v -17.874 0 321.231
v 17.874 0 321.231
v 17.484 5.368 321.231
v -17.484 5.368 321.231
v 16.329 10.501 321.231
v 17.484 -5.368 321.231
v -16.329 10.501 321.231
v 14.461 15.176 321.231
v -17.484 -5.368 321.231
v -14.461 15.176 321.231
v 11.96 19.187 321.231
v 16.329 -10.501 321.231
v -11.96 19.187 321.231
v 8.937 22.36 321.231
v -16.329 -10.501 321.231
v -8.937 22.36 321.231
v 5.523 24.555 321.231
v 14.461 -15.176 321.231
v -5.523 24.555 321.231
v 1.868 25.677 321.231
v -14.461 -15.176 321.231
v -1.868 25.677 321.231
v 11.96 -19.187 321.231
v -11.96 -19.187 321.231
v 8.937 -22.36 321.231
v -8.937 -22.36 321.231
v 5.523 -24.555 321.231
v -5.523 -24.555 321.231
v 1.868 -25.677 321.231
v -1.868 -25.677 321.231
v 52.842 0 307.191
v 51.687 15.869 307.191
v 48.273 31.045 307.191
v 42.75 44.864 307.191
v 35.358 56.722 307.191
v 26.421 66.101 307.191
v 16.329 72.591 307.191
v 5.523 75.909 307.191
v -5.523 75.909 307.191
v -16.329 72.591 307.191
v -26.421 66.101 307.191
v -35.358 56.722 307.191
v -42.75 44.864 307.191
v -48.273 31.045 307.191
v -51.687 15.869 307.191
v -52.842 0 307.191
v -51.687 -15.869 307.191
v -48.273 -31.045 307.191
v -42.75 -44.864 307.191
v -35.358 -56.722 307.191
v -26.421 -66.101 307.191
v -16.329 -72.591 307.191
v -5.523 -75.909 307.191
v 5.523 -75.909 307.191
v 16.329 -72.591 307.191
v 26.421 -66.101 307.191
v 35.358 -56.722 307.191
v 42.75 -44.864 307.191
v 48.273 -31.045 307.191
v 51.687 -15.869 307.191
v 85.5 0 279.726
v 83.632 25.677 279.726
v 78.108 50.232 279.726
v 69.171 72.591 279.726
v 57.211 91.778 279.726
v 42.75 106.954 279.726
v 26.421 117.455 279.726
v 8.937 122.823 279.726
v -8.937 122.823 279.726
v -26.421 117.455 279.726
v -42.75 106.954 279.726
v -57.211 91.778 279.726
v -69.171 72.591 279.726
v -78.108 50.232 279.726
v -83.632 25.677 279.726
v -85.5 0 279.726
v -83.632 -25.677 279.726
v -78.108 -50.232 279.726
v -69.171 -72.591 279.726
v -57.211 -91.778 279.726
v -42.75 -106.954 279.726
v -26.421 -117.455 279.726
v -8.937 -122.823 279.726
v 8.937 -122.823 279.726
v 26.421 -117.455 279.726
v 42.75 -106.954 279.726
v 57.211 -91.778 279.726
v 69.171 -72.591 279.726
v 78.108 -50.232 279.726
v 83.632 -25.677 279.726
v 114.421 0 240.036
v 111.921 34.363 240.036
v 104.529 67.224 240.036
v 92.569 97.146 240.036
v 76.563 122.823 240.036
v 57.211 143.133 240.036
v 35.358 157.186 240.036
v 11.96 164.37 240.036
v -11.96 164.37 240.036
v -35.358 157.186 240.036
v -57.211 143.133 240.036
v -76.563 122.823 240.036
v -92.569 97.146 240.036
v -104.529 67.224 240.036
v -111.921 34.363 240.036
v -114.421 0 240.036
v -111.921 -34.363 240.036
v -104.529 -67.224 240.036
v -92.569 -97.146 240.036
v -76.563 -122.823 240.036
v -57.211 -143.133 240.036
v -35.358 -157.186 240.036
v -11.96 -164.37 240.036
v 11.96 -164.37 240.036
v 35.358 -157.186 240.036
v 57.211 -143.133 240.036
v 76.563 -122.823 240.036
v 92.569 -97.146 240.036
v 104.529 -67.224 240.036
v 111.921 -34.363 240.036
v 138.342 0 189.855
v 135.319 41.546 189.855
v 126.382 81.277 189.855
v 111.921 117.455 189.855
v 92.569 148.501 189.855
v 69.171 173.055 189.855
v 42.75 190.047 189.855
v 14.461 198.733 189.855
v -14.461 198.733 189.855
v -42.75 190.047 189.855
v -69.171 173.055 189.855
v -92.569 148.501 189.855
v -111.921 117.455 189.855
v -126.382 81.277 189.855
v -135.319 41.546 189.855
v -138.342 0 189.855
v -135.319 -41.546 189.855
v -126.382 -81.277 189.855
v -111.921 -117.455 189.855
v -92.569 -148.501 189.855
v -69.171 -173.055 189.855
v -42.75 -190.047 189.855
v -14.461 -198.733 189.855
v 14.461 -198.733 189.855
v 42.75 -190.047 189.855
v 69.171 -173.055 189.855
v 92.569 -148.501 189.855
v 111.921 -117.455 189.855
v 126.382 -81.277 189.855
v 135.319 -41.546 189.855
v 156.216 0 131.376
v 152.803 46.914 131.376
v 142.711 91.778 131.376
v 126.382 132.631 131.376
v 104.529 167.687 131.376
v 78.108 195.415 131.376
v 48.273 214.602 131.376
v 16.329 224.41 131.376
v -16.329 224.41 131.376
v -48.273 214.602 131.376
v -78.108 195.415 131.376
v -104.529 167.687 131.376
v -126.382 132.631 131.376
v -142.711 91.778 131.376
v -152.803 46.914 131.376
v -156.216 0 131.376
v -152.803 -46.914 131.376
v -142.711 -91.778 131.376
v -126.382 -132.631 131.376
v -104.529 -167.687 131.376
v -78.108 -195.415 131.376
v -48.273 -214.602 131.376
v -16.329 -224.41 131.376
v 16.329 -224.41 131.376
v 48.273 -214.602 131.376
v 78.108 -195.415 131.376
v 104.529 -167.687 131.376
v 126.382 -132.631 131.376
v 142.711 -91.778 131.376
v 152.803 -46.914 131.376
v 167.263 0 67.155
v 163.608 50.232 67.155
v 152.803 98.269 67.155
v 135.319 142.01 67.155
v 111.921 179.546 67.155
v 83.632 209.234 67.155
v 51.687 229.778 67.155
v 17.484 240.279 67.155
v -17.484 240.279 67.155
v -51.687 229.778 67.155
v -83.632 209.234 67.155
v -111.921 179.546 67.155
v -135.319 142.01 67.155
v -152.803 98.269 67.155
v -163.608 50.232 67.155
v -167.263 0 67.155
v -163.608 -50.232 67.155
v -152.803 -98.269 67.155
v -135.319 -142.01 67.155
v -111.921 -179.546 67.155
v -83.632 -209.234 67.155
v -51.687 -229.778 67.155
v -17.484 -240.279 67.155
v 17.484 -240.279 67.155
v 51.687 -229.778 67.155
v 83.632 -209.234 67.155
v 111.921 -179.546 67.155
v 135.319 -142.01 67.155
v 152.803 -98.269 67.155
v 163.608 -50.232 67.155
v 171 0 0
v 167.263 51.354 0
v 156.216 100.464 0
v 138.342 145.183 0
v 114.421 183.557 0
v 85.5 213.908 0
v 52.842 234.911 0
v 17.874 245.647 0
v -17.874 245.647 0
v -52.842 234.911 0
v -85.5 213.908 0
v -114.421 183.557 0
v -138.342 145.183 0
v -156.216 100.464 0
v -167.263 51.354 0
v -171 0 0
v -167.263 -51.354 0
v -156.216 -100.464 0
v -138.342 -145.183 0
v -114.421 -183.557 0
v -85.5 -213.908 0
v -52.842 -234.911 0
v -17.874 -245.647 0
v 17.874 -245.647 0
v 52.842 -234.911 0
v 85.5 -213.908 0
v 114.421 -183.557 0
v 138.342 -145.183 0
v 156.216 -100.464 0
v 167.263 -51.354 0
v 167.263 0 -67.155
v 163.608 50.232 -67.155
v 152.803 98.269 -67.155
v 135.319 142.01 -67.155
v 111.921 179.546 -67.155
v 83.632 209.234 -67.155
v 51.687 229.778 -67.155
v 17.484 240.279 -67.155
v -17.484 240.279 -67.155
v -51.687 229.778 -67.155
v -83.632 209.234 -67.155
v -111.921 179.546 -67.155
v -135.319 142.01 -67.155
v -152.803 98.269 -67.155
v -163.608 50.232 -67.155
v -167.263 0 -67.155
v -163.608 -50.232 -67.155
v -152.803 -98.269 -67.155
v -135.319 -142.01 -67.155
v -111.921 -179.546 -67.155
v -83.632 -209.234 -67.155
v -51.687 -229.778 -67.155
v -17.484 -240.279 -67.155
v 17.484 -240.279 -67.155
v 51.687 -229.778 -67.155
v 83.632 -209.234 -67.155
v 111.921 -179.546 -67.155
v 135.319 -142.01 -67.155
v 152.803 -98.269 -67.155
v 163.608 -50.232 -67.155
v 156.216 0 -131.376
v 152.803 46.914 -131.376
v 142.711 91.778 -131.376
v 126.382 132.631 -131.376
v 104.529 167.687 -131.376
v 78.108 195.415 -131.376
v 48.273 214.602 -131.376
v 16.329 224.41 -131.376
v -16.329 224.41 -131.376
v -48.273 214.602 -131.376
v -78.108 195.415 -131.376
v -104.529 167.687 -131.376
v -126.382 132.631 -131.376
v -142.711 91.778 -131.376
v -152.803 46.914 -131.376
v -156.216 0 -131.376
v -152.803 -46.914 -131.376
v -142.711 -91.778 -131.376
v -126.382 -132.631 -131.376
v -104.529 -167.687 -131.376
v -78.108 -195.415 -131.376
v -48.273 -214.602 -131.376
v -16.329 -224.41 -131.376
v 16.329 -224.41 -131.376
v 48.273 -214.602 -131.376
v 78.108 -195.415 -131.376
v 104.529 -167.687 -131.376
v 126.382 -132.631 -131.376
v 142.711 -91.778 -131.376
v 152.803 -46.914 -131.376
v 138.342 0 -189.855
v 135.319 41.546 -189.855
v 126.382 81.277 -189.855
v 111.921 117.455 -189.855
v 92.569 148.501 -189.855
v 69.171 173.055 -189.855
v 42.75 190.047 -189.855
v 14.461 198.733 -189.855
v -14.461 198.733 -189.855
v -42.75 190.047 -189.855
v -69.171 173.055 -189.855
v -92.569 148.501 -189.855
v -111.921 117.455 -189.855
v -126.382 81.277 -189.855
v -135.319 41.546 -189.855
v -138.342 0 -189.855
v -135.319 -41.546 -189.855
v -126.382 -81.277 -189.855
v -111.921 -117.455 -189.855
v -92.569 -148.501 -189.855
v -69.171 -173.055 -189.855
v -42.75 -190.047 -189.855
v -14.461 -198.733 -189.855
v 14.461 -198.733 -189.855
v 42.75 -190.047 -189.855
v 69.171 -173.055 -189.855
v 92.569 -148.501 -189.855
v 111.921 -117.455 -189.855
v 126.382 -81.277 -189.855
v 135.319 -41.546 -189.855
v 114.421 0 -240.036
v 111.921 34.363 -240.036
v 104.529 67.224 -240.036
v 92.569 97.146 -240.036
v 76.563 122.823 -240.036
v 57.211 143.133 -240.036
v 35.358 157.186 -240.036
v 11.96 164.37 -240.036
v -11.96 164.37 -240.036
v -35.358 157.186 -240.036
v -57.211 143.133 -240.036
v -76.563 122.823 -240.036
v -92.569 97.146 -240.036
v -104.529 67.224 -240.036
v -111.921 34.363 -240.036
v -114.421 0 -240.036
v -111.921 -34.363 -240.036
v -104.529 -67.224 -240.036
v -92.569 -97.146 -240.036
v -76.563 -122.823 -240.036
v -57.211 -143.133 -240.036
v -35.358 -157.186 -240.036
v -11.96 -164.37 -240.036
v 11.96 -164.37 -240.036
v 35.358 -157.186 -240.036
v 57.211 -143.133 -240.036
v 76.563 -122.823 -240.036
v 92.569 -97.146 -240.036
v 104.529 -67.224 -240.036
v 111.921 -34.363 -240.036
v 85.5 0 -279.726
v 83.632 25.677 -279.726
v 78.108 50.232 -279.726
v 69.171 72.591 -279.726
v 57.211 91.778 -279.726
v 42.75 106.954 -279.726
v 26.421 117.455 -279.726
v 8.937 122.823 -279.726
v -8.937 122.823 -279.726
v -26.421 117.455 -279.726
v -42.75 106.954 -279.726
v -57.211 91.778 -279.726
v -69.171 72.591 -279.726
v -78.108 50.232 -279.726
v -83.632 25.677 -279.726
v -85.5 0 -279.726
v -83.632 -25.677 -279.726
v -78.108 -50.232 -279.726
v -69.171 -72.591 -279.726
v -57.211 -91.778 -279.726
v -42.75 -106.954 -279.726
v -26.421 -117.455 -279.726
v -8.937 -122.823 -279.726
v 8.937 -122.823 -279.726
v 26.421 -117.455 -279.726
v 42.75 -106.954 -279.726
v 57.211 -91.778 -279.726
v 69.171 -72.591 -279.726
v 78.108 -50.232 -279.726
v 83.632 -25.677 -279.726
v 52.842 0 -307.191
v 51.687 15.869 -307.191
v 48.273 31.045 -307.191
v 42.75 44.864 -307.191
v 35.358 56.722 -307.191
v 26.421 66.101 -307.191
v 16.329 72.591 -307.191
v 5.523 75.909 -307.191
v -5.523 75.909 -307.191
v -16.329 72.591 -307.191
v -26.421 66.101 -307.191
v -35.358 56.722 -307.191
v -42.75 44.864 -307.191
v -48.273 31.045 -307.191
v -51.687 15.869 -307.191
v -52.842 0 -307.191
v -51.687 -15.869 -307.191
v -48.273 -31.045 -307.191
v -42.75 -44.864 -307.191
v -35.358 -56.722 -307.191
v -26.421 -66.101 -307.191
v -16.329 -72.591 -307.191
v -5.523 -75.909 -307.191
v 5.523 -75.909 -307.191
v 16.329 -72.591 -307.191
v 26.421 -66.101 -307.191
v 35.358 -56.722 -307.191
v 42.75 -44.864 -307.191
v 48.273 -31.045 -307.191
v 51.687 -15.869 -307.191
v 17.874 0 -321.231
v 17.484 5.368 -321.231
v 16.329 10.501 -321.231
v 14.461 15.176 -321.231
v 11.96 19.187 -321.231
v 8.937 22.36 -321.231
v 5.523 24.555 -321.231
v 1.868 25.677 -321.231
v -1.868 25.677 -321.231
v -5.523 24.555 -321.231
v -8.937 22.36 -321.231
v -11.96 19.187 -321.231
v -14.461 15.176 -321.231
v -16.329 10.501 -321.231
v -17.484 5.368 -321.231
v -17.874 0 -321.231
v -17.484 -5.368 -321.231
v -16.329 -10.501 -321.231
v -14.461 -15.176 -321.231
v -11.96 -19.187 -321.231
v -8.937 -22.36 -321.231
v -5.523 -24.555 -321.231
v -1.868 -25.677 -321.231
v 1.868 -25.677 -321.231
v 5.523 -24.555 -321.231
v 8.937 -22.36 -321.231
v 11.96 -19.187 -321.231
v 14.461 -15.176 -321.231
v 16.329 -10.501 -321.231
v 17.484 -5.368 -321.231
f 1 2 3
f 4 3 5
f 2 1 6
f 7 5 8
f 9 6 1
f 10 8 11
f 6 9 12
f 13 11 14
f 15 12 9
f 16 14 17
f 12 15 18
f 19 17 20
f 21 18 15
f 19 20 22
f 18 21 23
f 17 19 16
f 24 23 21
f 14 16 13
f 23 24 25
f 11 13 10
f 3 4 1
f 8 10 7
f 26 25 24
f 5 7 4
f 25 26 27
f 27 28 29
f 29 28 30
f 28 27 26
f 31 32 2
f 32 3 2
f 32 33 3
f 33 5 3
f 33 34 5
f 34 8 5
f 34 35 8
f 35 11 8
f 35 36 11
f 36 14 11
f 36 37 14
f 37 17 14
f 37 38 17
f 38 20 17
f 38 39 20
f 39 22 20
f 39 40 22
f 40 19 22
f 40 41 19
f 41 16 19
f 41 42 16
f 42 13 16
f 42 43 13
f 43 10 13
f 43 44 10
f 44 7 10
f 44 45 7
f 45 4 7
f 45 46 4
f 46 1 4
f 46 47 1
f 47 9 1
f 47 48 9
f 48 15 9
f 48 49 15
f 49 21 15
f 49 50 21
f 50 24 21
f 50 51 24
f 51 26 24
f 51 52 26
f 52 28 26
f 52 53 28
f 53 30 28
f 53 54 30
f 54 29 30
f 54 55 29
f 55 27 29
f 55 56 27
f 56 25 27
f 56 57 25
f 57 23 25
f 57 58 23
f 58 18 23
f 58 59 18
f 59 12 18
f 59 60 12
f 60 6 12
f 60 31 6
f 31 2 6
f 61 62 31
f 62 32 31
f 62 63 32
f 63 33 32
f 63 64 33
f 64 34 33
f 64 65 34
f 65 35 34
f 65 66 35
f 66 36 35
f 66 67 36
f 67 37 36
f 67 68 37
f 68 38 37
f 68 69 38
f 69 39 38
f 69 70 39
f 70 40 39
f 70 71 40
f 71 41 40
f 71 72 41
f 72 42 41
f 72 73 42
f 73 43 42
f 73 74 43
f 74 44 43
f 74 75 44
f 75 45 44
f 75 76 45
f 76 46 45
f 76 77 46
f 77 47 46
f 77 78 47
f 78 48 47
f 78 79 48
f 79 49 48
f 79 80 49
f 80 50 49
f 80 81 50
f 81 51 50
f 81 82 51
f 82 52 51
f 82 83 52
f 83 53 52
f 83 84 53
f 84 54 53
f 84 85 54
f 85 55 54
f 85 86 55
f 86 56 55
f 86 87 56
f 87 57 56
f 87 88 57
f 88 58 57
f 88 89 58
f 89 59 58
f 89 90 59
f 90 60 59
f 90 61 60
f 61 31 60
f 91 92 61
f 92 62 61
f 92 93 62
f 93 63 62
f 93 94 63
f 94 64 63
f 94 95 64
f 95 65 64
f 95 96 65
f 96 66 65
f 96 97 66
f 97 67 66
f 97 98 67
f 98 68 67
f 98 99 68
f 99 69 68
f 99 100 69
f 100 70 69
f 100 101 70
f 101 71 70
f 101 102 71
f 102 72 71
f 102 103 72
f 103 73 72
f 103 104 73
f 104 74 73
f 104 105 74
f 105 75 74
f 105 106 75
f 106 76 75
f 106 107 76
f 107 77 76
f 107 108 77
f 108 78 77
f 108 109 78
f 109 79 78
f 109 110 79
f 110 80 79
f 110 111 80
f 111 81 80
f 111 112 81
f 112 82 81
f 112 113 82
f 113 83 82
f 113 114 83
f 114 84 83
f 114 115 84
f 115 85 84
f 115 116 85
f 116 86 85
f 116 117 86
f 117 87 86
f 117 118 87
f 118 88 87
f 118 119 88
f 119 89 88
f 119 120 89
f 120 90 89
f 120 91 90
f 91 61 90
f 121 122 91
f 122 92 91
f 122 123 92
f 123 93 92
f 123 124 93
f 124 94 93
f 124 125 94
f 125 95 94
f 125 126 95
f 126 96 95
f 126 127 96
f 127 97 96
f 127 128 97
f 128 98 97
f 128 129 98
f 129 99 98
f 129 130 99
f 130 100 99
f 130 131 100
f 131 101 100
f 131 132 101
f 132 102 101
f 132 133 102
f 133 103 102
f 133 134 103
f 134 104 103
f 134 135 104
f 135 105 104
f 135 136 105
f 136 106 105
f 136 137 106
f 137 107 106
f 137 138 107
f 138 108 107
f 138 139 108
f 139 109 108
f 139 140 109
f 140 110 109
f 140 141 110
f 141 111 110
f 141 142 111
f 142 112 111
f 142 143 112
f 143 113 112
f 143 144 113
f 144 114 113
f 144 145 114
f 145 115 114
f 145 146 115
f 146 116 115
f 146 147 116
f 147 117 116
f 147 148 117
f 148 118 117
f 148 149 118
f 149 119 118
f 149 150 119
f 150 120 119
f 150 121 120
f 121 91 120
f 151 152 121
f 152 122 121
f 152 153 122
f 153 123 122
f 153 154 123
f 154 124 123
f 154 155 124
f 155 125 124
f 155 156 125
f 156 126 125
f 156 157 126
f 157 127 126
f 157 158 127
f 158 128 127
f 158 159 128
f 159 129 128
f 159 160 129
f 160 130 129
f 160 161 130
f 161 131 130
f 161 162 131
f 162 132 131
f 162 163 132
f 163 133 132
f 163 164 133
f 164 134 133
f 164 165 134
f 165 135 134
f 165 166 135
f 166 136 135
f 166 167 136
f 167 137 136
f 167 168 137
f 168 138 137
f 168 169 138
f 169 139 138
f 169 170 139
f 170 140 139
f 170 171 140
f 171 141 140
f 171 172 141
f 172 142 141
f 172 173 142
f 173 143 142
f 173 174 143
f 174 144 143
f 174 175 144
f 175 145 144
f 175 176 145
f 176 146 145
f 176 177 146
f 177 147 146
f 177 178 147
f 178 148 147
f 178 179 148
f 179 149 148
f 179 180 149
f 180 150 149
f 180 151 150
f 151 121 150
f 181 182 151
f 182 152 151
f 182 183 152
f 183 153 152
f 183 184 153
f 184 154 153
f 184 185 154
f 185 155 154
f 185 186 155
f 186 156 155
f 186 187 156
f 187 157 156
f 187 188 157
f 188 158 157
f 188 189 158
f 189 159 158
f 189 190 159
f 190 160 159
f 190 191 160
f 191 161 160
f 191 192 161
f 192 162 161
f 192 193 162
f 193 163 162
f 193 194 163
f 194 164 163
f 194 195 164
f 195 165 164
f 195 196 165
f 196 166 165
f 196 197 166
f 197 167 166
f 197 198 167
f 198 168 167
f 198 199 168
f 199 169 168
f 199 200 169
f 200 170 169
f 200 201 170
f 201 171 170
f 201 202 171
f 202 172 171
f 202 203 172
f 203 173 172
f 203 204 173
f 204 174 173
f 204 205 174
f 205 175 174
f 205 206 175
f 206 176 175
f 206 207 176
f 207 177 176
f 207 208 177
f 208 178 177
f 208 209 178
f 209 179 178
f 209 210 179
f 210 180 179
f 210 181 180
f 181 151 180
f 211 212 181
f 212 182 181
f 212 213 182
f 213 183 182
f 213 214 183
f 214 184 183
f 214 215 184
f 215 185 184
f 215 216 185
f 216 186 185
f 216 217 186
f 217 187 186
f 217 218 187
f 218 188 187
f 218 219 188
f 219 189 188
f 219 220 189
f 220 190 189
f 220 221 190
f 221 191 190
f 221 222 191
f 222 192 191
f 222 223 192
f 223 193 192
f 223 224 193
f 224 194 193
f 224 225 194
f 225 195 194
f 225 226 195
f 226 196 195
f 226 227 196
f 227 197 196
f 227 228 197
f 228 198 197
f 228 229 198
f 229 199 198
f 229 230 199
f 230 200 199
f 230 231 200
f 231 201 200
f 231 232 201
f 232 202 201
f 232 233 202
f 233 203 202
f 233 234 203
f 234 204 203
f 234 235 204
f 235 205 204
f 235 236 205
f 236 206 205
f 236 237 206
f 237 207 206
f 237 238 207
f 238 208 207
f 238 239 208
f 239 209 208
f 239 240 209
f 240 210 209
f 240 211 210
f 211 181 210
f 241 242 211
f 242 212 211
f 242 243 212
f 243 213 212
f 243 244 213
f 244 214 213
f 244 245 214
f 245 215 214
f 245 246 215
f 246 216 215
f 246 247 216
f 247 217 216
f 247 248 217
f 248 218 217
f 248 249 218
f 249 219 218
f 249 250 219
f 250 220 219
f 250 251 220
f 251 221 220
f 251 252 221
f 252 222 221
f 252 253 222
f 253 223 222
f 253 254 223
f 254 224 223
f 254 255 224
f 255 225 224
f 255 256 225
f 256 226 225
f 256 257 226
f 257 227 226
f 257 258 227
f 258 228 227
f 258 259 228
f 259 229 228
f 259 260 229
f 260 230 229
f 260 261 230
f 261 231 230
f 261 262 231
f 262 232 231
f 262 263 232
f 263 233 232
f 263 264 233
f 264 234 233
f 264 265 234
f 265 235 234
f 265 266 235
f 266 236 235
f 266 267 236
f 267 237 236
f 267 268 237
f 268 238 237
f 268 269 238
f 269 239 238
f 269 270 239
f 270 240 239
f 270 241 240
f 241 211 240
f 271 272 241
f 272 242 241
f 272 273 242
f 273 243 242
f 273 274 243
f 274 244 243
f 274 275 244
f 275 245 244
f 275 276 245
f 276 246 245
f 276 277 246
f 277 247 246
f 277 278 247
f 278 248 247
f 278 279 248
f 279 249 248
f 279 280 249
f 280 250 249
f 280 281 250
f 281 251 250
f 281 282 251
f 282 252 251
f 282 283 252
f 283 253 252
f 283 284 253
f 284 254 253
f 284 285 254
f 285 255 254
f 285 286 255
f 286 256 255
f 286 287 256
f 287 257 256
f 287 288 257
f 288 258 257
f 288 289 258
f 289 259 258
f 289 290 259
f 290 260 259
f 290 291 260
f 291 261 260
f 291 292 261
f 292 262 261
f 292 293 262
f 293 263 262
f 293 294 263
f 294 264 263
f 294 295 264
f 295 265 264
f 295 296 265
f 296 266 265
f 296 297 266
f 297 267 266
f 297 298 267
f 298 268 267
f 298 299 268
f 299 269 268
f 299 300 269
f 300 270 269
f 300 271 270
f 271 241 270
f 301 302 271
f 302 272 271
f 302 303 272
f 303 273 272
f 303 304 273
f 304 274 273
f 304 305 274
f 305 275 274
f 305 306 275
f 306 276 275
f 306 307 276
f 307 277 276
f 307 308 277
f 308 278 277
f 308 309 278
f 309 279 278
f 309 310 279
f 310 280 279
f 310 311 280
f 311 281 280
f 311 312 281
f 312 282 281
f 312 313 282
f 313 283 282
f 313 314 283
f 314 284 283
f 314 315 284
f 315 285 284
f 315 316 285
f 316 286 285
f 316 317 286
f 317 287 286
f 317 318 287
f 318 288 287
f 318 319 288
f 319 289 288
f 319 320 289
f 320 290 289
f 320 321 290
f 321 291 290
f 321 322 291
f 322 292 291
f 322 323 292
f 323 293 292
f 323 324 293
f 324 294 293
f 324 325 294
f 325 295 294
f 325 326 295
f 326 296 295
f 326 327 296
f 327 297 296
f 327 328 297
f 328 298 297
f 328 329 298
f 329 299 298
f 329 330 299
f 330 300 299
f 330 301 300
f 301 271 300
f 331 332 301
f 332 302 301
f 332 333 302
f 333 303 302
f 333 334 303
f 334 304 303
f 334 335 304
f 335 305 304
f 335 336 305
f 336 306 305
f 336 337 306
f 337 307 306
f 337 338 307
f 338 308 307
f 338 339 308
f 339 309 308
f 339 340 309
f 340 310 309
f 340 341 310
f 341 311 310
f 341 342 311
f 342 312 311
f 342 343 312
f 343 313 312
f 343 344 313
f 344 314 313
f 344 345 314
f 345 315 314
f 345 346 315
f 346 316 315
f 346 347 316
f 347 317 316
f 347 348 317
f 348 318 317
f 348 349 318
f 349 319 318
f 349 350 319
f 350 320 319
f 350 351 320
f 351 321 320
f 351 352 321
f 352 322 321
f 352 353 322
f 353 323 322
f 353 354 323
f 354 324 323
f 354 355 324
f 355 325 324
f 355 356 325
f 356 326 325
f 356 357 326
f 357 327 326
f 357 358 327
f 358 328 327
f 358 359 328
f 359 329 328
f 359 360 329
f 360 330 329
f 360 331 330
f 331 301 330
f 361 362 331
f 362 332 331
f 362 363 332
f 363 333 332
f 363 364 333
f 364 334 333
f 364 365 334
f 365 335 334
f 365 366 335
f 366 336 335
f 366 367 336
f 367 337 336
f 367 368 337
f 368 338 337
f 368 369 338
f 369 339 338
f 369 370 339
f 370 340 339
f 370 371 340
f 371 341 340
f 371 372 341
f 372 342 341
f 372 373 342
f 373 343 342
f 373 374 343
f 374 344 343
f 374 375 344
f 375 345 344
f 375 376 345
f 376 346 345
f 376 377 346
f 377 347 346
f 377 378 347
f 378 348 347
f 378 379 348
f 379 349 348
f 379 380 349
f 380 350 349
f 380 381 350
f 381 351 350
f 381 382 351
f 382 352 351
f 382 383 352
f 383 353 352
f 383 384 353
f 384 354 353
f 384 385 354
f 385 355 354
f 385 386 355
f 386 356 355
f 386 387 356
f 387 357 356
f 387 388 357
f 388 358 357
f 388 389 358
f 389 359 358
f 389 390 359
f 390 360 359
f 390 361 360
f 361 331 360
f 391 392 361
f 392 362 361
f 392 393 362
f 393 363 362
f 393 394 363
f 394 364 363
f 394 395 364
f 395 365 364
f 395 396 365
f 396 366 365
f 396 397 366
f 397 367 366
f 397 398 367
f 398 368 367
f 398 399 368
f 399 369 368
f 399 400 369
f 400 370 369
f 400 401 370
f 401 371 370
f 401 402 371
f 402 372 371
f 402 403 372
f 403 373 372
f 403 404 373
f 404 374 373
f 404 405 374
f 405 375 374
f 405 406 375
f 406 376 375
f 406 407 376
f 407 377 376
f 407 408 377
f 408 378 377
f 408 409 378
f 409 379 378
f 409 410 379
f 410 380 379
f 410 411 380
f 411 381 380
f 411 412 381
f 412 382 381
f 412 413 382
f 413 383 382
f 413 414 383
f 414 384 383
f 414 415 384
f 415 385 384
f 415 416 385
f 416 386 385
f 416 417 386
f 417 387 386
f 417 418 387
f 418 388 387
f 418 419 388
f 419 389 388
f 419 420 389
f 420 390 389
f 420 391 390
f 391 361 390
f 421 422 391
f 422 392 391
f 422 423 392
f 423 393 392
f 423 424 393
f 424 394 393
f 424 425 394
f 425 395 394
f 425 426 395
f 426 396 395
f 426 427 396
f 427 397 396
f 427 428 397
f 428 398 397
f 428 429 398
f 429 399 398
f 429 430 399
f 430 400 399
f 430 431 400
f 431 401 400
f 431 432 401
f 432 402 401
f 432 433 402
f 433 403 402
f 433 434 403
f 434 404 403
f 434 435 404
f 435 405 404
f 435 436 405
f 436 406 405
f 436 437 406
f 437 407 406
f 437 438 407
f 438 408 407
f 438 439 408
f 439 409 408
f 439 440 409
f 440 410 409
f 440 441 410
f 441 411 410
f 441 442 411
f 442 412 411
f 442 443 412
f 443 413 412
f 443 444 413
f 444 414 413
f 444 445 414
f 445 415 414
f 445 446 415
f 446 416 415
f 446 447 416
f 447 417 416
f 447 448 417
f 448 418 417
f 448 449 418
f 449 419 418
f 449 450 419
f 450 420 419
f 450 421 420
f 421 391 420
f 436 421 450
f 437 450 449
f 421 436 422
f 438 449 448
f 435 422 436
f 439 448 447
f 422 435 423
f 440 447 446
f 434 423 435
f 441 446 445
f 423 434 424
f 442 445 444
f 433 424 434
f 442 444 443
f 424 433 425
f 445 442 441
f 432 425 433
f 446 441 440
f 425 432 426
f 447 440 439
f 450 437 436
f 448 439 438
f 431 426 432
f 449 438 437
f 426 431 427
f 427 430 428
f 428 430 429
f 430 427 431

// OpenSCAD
// Generated by SolidPython 1.0.1 on 2020-07-29 00:46:49


scale(v = [9, 13, 17]) {
	sphere(r = 19);
}
/***********************************************
*********      SolidPython code:      **********
************************************************
 
# import packages: SolidPython
from solid import *
from solid.utils import *
from itertools import chain, combinations, permutations


class Resize:

    def __init__(self, scad_file):
        self.scad_file = scad_file
        #self.scad_file = import_scad(scad_file)
        # cone/cylinder param:
        self.r1 = 0
        self.r2 = 0
        self.h = 0
        # rectangular prism param:
        self.w = 0
        self.l = 0
        # ellipse param:
        self.r = 0

    # import OpenScad code (file name corresponds to shape)


    # classify shape + parameters
    def assign(self, param1, param2, param3):
        if self.scad_file == 'cone.scad':
            self.r1 = param1
            self.r2 = param2
            self.h = param3
        elif self.scad_file == 'cylinder.scad':
            self.r1 = param1
            self.r2 = param2
            self.h = param3
        elif self.scad_file == 'rectangularPrism.scad':
            self.h = param1
            self.l = param2
            self.w = param3
        else:
            self.r = param1
            self.h = param2

    # resize parameters
    def iterate(self):
        x = range(3, 20, 2)
        i = 1
        if self.scad_file == 'cone.scad':
            tempList = list(permutations(x, 2))
            for temp in tempList:
                param1 = temp[0]
                param2 = temp[1]
                filepath = 'produced_scad_files/' + 'cone' + str(param1) + '_' + str(param2) + '_' + '.scad'
                scad_render_to_file(cylinder(h=param1, r1=param2, r2=0), filepath)

        elif self.scad_file == 'cylinder.scad':
            tempList = list(permutations(x, 3))
            for temp in tempList:
                param1 = temp[0]
                param2 = temp[1]
                filepath = 'produced_scad_files/' + 'cylinder' + str(param1) + '_' + str(param2) + '_' + '.scad'
                scad_render_to_file(cylinder(h=param1, r1=param2, r2=param2), filepath)

        elif self.scad_file == 'rectangularPrism.scad':
            tempList = list(permutations(x, 3))
            for temp in tempList:
                param1 = temp[0]
                param2 = temp[1]
                param3 = temp[2]
                filepath = 'produced_scad_files/' + 'rectangularPrism' + str(param1) + '_' + str(param2) + '_' + str(
                    param3) + '.scad'
                scad_render_to_file(cube(size=(param1, param2, param3)), filepath)

        elif self.scad_file == 'ellipse.scad':
            tempList = list(permutations(x, 4))
            for temp in tempList:
                param1 = temp[0]
                param2 = temp[1]
                param3 = temp[2]
                param4 = temp[3]
                filepath = 'produced_scad_files/' + 'ellipse' + str(param1) + '_' + str(param2) + '_' + str(param3) + '_' + str(param4) + '.scad'
                scad_render_to_file(scale([param1, param2, param3])(sphere(r=param4)), filepath)

    def render_to_scadfile(self):
        scad_render_to_file(scad, 'example.scad') 
 
************************************************/
